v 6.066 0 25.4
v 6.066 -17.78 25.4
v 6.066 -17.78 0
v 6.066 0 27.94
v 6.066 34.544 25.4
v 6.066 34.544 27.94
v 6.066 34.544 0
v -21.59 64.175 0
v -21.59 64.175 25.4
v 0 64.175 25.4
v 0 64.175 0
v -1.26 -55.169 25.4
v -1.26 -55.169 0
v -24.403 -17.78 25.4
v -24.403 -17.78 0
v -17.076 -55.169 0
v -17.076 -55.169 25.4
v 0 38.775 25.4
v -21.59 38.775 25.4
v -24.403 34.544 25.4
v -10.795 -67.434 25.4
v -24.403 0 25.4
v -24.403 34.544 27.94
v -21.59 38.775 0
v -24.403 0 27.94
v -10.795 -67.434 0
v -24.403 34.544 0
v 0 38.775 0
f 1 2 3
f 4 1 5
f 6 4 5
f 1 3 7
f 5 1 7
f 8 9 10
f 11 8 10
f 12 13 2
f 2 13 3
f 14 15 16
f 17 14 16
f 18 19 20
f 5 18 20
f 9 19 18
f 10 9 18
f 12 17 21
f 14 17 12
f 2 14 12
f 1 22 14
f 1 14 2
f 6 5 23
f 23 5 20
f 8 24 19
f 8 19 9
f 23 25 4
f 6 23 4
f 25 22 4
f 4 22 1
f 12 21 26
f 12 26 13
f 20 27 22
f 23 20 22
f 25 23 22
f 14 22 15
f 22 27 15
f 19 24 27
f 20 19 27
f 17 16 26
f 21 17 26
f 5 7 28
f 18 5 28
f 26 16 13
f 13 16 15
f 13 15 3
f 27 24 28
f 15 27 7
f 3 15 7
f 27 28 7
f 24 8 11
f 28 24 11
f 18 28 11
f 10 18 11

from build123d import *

# Parameters (mm, degrees)
F0_W     = 21.59
F0_H     = 25.4
F1_DEPTH = 25.4
F2_DEPTH = 27.94
F3_DEPTH = 25.4


with BuildPart() as f1:
    # F0 (on Top) → F1 (new body)
    with BuildSketch(Plane.XY):
        with Locations((-10.795, 51.474535)):
            Rectangle(F0_W, F0_H)
        Polygon((-24.402696, 34.54427), (6.066474, 34.54427), (0, 38.774535), (-21.59, 38.774535), align=None)
    extrude(amount=F1_DEPTH)

    # F0 (on Top) → F2 (join)
    with BuildSketch(Plane.XY):
        Polygon((-10.795, 0), (0, 0), (6.066474, 0), (6.066474, 34.54427), (-24.402696, 34.54427), (-24.402696, 0), (-21.59, 0), align=None)
    extrude(amount=F2_DEPTH)

    # F0 (on Top) → F3 (join)
    with BuildSketch(Plane.XY):
        Polygon((6.066474, 0), (0, 0), (-10.795, 0), (-21.59, 0), (-24.402696, 0), (-24.402696, -17.78), (-17.076401, -55.168974), (-10.795, -67.434295), (-1.259822, -55.168974), (6.066474, -17.78), align=None)
    extrude(amount=F3_DEPTH)


solid = f1.part
